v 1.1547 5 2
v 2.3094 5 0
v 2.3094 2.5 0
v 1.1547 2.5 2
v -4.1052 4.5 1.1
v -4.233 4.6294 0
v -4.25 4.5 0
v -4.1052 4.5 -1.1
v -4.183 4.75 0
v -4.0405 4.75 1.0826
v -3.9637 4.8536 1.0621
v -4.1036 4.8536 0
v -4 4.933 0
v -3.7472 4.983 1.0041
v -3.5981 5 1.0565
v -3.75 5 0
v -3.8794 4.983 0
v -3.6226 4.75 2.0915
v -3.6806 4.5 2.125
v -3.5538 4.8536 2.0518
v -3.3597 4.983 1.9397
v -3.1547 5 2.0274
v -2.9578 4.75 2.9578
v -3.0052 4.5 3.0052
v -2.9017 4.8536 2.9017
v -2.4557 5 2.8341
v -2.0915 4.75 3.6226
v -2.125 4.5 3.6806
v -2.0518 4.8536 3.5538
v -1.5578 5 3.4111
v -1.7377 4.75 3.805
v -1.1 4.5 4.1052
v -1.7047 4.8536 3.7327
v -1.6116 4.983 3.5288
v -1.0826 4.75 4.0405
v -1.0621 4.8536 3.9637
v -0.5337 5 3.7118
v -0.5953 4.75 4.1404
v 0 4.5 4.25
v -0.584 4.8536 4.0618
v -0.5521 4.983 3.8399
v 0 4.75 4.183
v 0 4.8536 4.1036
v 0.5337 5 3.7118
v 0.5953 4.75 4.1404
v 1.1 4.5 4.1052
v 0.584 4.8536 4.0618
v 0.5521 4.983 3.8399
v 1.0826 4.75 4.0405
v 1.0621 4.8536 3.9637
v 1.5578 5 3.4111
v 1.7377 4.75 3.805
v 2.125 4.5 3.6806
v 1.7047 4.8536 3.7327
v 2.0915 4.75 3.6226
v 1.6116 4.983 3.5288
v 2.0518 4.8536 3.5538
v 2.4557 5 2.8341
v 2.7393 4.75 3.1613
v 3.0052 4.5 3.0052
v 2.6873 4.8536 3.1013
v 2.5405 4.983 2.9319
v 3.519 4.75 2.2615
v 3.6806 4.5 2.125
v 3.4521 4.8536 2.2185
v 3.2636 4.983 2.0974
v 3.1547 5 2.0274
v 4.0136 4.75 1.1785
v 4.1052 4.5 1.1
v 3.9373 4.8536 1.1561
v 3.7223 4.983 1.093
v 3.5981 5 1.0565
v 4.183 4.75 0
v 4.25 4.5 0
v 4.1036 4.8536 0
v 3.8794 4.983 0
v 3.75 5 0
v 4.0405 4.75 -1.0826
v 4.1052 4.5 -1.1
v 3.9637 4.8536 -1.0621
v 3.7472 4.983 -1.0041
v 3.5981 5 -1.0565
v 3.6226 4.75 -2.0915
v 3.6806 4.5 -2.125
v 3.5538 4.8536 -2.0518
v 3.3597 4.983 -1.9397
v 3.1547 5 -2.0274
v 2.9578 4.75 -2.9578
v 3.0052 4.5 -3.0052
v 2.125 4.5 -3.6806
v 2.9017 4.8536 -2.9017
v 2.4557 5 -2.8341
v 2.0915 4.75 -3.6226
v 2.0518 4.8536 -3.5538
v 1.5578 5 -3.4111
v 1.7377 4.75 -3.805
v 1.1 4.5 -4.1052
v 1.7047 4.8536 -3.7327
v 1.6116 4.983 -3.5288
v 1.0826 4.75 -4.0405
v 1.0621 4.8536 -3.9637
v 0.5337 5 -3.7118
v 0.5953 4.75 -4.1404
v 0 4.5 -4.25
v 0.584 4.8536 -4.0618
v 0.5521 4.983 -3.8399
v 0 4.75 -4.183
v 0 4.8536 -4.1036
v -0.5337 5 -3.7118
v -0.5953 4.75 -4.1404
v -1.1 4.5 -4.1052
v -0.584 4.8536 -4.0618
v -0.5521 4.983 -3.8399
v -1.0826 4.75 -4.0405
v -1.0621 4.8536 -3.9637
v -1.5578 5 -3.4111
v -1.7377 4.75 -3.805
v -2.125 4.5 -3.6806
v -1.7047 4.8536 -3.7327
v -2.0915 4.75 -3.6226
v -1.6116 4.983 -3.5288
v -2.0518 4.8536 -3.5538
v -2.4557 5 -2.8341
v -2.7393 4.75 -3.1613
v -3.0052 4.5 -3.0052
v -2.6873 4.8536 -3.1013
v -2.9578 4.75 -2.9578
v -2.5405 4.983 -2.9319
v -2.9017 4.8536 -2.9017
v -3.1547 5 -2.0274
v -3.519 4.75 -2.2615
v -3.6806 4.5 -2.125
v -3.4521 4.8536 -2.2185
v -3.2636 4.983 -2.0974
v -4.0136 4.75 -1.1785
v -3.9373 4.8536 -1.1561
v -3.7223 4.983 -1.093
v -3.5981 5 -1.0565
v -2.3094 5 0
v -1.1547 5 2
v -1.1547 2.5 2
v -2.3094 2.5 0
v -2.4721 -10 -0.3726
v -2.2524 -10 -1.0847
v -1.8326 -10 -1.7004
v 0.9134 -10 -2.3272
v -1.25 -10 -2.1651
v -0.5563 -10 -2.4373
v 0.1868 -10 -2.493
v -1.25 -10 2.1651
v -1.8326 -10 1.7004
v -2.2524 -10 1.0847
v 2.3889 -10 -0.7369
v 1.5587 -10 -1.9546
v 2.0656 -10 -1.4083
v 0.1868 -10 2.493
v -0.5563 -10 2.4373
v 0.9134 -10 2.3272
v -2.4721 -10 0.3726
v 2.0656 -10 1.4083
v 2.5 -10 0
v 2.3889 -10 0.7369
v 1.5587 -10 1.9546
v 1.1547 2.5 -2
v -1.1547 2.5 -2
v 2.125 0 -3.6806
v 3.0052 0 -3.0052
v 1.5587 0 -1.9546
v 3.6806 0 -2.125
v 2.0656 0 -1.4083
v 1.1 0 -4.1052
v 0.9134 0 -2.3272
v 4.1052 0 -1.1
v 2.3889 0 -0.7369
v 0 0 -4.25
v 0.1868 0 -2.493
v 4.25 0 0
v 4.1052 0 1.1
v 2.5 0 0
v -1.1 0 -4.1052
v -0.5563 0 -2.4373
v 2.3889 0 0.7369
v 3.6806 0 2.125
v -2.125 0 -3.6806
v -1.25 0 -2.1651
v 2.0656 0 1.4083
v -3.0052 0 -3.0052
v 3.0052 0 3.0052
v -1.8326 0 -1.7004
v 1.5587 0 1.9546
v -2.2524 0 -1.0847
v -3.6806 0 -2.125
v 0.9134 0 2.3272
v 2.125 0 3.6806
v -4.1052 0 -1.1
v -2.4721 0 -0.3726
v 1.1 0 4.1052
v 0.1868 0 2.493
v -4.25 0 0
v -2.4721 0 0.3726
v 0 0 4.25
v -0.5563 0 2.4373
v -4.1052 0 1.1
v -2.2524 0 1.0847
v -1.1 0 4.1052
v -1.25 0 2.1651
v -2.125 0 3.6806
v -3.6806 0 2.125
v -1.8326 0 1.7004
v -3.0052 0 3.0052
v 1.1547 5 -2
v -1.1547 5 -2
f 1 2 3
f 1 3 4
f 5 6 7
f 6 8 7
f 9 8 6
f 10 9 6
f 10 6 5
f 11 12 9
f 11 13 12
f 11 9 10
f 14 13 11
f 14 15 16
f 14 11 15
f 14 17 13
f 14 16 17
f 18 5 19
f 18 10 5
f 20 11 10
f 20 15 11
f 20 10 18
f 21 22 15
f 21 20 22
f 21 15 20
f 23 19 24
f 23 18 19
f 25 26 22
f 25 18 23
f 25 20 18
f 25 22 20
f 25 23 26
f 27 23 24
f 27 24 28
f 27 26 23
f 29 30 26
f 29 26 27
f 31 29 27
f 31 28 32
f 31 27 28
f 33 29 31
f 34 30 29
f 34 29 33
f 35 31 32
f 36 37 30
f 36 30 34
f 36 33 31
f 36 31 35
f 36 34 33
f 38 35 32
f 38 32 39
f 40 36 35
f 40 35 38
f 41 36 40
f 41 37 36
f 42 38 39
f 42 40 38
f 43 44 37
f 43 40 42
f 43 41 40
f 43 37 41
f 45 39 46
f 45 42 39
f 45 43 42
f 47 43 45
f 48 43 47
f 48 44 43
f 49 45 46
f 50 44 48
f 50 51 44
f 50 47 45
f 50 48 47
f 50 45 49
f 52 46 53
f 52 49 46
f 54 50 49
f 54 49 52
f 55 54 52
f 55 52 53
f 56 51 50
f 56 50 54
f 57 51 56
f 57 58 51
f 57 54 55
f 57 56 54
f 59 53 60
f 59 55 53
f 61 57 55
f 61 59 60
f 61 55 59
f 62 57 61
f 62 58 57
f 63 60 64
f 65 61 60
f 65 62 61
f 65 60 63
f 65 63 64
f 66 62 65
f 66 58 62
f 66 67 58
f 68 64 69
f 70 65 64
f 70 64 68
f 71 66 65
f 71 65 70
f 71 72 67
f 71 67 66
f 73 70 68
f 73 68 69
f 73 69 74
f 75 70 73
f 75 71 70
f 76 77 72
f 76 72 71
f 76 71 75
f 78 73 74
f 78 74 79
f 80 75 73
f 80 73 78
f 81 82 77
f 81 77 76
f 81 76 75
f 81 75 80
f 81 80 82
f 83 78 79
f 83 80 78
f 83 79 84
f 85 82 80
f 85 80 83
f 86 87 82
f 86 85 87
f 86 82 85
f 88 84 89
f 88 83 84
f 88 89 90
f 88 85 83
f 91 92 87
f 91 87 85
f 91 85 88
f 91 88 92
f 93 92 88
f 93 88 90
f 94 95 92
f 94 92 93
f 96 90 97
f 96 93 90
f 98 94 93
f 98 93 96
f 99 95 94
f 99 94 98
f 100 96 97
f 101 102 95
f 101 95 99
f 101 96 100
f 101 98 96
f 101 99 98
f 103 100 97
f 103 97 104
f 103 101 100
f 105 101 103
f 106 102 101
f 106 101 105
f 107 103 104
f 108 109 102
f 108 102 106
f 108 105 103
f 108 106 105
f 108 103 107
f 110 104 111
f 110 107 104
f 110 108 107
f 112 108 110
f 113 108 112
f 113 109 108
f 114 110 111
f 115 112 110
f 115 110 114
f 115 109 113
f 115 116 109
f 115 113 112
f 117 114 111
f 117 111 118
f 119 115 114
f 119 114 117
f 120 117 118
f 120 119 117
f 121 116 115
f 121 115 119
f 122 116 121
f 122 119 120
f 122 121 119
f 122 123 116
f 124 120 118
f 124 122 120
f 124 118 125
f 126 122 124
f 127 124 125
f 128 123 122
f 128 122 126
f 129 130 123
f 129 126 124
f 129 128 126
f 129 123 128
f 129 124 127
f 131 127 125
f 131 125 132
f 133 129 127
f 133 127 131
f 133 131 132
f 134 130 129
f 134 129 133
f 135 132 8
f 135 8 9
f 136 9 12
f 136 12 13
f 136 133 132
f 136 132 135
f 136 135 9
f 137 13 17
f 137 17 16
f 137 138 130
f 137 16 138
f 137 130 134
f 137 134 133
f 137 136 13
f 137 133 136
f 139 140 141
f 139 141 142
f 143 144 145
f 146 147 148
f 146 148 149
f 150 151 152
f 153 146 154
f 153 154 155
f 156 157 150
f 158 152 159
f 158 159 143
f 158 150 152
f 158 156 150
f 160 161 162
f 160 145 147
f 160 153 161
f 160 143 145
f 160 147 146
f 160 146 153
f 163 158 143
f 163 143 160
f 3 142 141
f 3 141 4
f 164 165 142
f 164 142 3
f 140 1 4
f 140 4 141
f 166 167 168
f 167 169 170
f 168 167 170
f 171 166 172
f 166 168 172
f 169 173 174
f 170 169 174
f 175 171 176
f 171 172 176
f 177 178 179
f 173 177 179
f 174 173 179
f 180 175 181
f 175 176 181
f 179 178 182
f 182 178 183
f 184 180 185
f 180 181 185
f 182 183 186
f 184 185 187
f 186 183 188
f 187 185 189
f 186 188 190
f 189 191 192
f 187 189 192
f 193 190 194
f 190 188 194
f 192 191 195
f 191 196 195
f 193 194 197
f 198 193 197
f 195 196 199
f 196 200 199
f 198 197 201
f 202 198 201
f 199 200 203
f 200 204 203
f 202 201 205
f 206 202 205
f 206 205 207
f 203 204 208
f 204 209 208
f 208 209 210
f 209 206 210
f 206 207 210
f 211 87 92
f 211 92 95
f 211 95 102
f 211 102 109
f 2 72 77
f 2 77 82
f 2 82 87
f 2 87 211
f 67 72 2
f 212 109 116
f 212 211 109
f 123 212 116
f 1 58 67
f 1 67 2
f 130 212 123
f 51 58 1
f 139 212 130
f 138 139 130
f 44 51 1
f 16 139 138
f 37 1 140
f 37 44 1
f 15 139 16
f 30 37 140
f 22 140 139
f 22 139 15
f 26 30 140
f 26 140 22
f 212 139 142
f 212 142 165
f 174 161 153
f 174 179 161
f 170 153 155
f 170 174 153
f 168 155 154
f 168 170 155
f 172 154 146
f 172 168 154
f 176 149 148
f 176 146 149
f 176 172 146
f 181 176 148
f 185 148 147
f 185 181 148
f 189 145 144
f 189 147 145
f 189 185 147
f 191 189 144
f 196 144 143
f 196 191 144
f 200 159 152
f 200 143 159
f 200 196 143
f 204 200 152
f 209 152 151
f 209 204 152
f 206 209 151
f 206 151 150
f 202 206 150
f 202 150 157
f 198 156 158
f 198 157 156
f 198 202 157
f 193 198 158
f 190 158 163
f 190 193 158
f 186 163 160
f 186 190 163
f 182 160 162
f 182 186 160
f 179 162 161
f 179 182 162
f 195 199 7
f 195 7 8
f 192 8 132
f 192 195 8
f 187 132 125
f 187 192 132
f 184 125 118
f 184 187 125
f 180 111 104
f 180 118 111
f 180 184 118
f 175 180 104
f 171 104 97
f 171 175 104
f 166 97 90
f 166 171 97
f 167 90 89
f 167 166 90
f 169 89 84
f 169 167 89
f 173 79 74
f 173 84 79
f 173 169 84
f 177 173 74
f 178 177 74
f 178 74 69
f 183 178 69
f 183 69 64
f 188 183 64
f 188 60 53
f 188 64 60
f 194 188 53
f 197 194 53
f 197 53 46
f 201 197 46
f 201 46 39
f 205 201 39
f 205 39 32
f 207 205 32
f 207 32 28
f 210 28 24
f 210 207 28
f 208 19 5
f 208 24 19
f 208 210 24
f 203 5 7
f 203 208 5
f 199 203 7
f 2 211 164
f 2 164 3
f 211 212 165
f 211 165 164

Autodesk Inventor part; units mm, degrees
ref_plane "YZ Plane" through (0, 0, 0) normal (1, 0, 0) x (0, 1, 0)
ref_plane "XZ Plane" through (0, 0, 0) normal (0, 1, 0) x (-1, 0, 0)
ref_plane "XY Plane" through (0, 0, 0) normal (0, 0, 1) x (1, 0, 0)
sketch "Cap Cross Section" plane through (0, 0, 0) normal (0, 1, 0) x (-1, 0, 0)
  circle A0 centre (0, 0) radius 4.25
  dimension "d0" = 8.5
extrude "Cap" add sketch "Cap Cross Section" along normal blind 5
sketch "Key Socket Cutout Outline" plane through (0, 5, 0) normal (0, 1, 0) x (1, 0, 0)
  line L0 (1.1547, 2) -> (2.3094, 0)
  line L1 (2.3094, 0) -> (1.1547, -2)
  line L2 (1.1547, -2) -> (-1.1547, -2)
  line L3 (-1.1547, -2) -> (-2.3094, 0)
  line L4 (-2.3094, 0) -> (-1.1547, 2)
  line L5 (-1.1547, 2) -> (1.1547, 2)
  point P0 (0, 0)
  point P1 (0, 0)
  dimension "d3" = 4
extrude "Key Socket Cutout" cut sketch "Key Socket Cutout Outline" against normal blind 2.5
sketch "Body Cross Section" plane through (0, 0, 0) normal (0, -1, 0) x (1, 0, 0)
  circle A0 centre (0, 0) radius 2.5
  dimension "d6" = 5
extrude "Body" add sketch "Body Cross Section" along normal blind 10
thread "Thread" size "M5x0.8" class "6g" standard "ANSI Metric M Profile" full length
fillet "Cap Fillet" radius 0.5 1 edges at (4.25, 5, 0)
properties part number "SSCF-M5-10-A4" material "Stainless Steel AISI 317"
